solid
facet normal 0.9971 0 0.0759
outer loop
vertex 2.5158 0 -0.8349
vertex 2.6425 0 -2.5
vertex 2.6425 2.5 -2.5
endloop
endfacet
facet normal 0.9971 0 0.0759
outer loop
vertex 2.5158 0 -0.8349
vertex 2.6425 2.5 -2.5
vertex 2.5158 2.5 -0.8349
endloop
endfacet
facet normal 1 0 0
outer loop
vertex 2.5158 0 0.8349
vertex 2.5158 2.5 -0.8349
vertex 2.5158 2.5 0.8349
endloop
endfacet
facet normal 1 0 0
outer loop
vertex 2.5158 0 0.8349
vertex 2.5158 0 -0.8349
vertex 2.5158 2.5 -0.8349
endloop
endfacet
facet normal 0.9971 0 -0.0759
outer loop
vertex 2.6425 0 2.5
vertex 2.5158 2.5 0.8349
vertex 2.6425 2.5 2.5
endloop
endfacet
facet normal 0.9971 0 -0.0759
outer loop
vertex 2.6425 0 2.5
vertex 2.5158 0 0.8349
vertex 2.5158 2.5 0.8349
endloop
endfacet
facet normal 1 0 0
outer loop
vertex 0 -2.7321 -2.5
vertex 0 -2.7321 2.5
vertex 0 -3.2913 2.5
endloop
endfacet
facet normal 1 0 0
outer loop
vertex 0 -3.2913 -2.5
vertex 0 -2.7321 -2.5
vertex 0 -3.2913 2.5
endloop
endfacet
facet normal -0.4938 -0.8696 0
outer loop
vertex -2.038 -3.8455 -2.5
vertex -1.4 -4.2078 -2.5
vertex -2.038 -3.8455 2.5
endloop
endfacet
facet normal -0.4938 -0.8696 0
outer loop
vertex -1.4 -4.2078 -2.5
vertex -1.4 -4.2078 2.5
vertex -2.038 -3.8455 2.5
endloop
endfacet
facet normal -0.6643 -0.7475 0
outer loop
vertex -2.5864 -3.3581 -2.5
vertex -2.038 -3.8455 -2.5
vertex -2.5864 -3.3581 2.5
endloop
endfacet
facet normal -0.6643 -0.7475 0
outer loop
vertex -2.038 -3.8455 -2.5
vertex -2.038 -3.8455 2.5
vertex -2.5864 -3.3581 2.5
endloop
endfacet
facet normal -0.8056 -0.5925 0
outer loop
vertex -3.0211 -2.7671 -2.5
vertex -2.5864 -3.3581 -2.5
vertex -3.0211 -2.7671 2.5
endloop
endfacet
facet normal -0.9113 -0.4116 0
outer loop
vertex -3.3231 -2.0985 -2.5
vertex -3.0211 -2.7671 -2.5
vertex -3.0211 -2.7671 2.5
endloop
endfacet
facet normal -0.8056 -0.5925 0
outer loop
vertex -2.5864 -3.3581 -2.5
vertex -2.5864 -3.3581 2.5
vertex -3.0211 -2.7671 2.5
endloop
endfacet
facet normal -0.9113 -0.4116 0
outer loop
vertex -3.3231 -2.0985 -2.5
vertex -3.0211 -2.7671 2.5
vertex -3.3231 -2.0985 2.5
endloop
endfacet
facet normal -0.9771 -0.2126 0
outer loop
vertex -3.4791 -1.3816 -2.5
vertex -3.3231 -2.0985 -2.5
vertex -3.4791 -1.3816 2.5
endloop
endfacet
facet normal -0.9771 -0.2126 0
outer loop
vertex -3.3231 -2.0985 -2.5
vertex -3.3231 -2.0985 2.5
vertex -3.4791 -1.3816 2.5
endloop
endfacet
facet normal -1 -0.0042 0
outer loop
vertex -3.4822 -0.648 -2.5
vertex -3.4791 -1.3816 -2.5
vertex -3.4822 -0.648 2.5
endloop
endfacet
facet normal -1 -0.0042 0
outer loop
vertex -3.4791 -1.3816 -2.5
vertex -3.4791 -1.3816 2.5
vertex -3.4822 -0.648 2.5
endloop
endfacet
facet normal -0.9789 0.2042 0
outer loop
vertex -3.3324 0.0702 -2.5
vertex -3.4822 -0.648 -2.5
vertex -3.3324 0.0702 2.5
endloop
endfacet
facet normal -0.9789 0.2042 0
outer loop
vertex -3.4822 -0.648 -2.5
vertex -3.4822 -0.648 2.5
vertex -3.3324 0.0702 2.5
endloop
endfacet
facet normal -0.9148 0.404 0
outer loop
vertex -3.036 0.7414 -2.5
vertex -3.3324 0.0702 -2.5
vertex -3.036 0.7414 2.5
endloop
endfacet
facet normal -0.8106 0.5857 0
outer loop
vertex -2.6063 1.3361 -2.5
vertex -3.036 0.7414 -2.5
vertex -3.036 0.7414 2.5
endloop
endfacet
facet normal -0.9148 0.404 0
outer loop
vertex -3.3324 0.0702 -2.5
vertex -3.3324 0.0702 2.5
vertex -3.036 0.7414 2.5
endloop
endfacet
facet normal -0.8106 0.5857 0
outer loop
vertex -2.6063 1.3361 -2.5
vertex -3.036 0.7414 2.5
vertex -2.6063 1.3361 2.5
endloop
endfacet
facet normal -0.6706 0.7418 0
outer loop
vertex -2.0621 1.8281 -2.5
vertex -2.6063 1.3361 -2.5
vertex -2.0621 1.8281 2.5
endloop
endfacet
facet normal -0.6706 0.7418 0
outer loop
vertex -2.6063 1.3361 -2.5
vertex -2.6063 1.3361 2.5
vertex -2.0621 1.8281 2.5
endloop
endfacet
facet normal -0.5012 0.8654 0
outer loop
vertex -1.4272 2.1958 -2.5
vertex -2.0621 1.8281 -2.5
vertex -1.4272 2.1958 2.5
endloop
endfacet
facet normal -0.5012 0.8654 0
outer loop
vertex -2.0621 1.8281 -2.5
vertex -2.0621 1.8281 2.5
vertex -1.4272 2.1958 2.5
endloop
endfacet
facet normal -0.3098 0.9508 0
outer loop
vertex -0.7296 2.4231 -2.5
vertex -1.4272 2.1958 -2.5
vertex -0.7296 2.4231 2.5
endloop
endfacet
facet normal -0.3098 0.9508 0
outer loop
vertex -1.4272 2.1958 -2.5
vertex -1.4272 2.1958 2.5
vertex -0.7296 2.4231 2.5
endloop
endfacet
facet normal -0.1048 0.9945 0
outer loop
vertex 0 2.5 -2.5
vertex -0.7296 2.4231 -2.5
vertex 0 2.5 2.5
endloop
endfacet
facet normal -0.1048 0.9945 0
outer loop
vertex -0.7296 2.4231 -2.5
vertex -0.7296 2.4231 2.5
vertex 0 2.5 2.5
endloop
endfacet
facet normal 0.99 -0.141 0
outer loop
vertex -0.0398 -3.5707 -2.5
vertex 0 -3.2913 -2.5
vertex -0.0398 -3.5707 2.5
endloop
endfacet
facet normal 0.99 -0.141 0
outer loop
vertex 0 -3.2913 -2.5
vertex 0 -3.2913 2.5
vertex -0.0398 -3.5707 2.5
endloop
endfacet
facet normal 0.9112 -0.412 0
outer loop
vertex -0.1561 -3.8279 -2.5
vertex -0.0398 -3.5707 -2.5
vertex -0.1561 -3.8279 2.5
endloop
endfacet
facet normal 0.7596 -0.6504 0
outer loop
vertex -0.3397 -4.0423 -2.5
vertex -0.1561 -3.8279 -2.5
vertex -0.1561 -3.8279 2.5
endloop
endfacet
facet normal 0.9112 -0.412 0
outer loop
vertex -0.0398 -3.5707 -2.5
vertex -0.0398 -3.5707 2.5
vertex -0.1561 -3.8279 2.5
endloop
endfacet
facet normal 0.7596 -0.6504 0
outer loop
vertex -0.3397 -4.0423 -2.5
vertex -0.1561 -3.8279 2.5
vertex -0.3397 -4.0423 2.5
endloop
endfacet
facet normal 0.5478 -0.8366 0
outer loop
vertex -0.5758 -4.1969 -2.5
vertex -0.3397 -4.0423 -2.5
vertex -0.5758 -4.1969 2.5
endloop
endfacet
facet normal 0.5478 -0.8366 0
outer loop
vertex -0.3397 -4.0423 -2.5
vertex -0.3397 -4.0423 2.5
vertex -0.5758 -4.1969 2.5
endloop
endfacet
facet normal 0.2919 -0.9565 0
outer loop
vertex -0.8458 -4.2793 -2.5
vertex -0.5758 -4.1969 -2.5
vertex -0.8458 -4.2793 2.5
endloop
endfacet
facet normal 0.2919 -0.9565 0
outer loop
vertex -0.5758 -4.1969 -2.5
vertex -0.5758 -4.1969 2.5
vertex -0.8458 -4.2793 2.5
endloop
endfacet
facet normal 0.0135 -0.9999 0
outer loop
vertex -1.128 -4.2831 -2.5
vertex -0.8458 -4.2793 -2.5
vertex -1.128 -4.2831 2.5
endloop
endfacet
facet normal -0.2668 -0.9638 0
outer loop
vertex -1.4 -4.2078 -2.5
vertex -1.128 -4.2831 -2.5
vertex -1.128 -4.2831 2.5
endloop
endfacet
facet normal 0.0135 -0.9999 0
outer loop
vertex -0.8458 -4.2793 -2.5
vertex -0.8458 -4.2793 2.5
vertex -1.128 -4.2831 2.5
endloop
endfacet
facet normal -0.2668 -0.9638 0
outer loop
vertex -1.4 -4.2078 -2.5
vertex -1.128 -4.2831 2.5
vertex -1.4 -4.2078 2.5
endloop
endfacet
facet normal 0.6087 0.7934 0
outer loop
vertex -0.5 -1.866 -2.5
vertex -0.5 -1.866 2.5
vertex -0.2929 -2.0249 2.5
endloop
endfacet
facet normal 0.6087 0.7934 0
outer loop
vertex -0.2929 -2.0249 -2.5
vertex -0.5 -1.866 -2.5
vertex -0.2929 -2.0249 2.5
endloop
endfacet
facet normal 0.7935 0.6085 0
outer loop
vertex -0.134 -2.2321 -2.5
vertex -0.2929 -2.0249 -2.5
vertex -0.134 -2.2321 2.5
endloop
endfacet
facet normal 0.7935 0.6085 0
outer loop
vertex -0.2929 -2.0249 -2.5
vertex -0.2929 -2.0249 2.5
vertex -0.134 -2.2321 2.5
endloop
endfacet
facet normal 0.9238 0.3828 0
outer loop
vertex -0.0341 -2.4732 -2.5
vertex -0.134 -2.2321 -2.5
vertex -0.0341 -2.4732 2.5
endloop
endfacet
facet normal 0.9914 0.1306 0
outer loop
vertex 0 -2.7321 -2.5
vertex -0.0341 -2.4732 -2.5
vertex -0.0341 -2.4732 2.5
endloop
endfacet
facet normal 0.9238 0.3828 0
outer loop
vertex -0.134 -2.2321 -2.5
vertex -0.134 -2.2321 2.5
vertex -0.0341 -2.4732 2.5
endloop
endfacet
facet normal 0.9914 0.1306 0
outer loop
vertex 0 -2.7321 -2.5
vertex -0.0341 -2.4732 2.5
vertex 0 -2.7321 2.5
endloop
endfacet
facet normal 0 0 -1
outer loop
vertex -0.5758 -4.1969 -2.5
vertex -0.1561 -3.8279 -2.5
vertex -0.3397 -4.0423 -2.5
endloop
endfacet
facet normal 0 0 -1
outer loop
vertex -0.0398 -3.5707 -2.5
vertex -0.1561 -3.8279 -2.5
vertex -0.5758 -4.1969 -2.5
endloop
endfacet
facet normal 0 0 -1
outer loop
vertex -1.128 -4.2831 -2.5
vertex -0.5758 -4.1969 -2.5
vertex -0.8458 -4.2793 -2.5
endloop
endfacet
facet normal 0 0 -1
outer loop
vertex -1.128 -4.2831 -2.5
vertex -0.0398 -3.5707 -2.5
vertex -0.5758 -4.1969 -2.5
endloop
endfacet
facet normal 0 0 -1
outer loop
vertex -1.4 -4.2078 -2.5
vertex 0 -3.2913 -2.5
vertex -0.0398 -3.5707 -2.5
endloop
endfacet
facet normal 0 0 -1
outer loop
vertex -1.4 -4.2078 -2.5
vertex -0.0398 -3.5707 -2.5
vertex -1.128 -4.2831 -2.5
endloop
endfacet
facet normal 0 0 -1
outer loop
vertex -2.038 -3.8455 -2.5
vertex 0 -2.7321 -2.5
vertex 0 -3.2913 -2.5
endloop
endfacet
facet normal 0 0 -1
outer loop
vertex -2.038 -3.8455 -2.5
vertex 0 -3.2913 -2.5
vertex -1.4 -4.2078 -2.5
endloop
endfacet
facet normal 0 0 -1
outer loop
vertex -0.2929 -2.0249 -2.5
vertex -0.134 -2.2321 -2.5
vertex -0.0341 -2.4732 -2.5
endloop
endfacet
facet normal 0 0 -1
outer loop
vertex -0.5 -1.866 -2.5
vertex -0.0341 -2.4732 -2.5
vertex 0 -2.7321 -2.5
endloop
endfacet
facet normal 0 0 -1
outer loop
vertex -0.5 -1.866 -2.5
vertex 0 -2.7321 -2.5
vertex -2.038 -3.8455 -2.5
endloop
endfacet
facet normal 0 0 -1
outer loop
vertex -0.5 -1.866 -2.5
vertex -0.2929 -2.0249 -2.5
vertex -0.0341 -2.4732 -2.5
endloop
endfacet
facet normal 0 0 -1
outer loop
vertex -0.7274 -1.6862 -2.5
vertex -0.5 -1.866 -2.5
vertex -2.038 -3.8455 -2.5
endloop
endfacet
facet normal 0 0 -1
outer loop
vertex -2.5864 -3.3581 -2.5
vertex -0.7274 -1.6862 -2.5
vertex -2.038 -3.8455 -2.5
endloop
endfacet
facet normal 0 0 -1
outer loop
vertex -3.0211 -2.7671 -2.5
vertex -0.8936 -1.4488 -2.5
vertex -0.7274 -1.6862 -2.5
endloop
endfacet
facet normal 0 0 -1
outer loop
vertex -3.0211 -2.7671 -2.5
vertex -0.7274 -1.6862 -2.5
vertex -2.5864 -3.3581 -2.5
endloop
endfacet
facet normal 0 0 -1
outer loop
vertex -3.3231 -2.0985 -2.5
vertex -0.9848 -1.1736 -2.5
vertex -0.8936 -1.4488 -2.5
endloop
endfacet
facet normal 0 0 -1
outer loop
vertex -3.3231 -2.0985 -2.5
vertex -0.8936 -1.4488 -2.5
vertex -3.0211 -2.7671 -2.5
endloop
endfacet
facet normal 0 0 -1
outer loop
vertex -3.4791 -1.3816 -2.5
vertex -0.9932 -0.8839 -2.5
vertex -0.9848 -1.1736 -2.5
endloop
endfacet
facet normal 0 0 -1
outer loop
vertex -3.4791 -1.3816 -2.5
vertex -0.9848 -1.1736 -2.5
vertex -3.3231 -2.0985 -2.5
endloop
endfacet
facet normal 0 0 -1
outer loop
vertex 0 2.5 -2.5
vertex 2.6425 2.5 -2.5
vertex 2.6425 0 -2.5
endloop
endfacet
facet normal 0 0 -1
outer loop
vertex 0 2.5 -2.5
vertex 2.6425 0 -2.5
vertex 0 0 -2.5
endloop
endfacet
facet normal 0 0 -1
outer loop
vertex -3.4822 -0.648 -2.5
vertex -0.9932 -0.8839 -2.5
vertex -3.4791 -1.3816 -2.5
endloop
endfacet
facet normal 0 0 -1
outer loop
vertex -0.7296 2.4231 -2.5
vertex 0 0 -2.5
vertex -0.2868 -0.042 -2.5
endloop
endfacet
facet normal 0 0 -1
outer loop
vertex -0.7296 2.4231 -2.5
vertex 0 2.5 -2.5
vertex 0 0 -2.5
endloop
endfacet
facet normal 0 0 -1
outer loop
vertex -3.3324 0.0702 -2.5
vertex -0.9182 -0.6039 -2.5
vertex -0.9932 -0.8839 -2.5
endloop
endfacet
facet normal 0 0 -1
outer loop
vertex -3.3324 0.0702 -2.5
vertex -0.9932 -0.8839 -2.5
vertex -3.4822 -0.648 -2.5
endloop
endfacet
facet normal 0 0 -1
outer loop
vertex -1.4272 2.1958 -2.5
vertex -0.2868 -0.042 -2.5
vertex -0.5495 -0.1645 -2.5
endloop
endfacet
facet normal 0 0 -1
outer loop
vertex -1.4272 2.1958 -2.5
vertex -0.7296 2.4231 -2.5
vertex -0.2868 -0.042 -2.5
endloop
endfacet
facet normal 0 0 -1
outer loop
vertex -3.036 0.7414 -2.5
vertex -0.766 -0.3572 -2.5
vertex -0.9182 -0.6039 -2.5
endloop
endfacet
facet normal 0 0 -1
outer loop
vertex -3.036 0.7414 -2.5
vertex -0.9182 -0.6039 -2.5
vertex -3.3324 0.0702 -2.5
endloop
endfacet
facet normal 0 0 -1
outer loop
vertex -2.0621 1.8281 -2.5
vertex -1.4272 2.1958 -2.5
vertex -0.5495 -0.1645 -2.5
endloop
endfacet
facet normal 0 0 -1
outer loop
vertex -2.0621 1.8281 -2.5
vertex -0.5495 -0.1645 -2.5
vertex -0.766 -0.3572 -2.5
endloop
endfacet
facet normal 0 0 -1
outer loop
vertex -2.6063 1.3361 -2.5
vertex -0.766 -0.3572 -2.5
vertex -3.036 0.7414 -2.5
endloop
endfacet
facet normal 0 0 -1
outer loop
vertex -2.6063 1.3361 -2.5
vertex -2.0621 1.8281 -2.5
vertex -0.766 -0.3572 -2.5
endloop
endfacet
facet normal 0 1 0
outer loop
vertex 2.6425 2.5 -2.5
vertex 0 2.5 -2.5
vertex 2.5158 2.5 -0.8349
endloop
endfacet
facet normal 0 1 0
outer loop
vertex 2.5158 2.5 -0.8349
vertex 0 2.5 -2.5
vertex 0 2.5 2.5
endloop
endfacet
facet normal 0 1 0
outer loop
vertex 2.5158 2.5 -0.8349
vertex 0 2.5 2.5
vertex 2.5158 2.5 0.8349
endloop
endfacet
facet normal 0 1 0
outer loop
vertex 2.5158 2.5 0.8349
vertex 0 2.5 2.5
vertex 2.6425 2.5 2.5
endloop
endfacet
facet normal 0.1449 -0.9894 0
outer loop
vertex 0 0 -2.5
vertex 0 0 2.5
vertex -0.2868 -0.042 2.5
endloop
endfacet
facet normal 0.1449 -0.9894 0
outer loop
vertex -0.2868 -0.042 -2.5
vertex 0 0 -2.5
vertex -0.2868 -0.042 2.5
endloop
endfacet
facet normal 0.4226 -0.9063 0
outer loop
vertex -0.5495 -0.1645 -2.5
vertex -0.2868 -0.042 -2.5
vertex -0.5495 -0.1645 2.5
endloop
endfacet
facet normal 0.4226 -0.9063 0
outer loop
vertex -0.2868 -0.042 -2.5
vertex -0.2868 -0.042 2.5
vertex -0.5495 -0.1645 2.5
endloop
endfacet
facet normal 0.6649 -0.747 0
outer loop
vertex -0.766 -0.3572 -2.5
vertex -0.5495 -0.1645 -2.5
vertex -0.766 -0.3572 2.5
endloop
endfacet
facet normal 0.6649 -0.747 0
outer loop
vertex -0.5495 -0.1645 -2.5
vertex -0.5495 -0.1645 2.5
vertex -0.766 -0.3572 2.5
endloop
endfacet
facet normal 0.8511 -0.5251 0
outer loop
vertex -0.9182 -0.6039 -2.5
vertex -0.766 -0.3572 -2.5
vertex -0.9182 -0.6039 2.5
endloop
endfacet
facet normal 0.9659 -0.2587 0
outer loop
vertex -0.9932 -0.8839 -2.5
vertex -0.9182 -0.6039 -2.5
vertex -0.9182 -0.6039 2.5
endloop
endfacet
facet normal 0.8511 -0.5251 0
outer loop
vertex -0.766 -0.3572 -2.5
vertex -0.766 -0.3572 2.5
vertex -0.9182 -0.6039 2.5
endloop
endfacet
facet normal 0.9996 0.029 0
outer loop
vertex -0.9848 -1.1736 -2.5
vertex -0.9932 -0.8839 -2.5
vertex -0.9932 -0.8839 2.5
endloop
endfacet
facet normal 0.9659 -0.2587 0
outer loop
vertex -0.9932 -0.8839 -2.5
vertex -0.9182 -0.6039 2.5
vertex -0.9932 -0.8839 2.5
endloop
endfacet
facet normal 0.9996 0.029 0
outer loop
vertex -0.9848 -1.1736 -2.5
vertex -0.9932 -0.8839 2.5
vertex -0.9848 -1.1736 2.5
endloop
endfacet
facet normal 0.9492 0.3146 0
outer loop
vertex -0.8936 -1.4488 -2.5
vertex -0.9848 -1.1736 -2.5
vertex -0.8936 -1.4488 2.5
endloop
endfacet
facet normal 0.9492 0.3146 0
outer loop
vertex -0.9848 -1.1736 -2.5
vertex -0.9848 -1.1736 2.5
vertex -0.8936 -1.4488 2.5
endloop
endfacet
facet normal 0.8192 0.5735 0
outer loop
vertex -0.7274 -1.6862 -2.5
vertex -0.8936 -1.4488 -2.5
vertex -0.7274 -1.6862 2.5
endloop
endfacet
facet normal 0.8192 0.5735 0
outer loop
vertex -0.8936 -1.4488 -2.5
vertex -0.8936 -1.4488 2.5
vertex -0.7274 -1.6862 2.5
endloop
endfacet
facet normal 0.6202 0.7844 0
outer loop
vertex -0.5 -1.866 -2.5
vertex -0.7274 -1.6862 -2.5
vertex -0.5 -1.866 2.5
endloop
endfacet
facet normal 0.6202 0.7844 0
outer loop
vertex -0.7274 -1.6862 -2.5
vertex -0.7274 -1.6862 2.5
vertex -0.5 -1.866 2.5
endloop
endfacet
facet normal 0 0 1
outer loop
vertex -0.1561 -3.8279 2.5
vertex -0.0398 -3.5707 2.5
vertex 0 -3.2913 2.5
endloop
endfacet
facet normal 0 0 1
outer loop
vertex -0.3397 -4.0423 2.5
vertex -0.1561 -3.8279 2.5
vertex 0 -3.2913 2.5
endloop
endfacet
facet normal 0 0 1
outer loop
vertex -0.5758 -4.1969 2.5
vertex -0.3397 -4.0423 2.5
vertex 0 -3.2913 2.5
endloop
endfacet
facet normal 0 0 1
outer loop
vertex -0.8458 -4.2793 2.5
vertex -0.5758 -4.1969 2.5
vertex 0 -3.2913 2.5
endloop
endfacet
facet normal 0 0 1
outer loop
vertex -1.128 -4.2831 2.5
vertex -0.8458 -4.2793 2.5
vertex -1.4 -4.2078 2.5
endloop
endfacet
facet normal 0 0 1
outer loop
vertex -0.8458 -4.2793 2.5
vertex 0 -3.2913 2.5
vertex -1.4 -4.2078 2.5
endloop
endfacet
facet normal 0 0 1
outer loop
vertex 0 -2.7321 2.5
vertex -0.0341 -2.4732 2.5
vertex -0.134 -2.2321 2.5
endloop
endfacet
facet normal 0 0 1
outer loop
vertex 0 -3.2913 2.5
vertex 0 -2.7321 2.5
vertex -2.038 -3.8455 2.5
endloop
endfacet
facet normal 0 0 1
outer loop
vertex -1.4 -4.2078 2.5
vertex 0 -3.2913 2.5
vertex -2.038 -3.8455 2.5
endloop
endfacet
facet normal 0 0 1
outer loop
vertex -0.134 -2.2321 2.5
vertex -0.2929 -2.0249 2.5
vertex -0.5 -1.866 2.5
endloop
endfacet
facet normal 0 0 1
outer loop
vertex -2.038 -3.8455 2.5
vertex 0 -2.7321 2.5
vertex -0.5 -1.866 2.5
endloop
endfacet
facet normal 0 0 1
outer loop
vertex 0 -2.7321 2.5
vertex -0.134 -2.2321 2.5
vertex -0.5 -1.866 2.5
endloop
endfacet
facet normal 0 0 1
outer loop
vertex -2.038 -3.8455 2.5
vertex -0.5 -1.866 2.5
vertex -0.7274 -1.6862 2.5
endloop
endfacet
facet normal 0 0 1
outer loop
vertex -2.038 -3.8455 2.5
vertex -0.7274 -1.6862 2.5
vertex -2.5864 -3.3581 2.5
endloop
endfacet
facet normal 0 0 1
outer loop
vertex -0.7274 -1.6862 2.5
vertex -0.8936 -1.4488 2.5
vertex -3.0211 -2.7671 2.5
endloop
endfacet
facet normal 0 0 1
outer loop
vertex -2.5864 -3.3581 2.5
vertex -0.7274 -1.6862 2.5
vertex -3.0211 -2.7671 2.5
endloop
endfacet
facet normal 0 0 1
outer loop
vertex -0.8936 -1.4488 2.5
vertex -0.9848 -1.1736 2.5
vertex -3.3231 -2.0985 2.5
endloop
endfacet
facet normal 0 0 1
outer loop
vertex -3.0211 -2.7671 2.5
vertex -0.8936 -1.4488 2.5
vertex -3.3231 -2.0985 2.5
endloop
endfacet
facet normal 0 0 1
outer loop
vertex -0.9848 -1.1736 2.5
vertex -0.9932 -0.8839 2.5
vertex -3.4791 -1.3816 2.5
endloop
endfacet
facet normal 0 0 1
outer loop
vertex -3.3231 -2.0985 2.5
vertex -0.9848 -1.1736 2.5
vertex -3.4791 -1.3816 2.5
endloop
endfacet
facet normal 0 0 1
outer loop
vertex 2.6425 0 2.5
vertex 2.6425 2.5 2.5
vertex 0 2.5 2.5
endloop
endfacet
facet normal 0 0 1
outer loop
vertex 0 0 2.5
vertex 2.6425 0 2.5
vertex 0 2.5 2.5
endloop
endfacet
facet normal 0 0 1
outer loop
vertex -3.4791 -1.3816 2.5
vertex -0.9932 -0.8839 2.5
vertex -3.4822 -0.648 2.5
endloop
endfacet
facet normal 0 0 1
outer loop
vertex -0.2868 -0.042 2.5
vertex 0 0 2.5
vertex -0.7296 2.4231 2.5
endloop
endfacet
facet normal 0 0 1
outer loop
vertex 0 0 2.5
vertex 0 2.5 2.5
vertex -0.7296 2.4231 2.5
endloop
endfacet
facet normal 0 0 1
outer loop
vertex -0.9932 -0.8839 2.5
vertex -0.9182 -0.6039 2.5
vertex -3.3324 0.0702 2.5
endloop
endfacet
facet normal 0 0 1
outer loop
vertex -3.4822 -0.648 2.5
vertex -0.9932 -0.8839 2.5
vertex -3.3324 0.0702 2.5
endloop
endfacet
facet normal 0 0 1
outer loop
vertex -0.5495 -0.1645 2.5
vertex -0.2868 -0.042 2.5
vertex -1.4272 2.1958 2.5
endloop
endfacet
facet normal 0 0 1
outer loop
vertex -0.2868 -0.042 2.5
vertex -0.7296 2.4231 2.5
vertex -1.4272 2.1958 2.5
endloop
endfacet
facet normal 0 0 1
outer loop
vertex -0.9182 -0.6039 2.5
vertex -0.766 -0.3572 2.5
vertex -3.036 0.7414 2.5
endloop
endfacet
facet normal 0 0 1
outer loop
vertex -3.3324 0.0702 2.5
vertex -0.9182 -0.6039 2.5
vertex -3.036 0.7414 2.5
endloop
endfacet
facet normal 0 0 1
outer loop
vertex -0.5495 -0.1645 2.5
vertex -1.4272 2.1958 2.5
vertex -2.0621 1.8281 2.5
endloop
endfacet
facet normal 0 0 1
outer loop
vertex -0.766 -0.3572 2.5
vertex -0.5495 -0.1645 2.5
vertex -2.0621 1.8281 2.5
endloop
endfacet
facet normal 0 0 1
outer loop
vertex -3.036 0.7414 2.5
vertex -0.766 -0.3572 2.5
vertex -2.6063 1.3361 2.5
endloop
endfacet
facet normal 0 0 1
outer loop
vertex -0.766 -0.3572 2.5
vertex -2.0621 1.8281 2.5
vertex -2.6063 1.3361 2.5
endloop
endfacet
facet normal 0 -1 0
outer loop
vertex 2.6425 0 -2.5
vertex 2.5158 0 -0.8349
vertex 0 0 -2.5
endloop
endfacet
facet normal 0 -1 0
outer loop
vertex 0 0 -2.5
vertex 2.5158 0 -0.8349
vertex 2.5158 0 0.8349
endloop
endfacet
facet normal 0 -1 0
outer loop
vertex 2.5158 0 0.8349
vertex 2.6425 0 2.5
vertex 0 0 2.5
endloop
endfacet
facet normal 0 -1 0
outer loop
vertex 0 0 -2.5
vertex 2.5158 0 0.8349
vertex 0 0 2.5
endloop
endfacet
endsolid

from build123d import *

# Parameters (mm, degrees)
BOSS_EXTRUDE1_DEPTH = 2.5
SKETCH2_R           = 22
CUT_EXTRUDE1_DEPTH  = 9.383366498


with BuildPart() as part:
    # Sketch1 → Boss-Extrude1 (new, symmetric)
    with BuildSketch(Plane.XY):
        with BuildLine():
            Line((0, -2.732050808), (0, -3.291287847))
            ThreePointArc((0, -3.291287847), (-0.452277442, -4.127947874), (-1.4, -4.207802986))
            ThreePointArc((-1.4, -4.207802986), (-3.426172095, -0.284916247), (0, 2.5))
            Line((0, 2.5), (6.753938291, 2.5))
            Line((6.753938291, 2.5), (6.753938291, 0))
            Line((6.753938291, 0), (0, 0))
            ThreePointArc((0, 0), (-0.965925826, -0.741180955), (-0.5, -1.866025404))
            ThreePointArc((-0.5, -1.866025404), (-0.133974596, -2.232050808), (0, -2.732050808))
        make_face()
    extrude(amount=BOSS_EXTRUDE1_DEPTH, both=True)

    # Sketch2 → Cut-Extrude1 (cut, through all)
    with BuildSketch(Plane(origin=(0, 0, 0), x_dir=(1, 0, 0), z_dir=(0, 1, 0))):
        with Locations((24.5, 0)):
            Circle(SKETCH2_R)
    extrude(amount=CUT_EXTRUDE1_DEPTH, mode=Mode.SUBTRACT)


solid = part.part
